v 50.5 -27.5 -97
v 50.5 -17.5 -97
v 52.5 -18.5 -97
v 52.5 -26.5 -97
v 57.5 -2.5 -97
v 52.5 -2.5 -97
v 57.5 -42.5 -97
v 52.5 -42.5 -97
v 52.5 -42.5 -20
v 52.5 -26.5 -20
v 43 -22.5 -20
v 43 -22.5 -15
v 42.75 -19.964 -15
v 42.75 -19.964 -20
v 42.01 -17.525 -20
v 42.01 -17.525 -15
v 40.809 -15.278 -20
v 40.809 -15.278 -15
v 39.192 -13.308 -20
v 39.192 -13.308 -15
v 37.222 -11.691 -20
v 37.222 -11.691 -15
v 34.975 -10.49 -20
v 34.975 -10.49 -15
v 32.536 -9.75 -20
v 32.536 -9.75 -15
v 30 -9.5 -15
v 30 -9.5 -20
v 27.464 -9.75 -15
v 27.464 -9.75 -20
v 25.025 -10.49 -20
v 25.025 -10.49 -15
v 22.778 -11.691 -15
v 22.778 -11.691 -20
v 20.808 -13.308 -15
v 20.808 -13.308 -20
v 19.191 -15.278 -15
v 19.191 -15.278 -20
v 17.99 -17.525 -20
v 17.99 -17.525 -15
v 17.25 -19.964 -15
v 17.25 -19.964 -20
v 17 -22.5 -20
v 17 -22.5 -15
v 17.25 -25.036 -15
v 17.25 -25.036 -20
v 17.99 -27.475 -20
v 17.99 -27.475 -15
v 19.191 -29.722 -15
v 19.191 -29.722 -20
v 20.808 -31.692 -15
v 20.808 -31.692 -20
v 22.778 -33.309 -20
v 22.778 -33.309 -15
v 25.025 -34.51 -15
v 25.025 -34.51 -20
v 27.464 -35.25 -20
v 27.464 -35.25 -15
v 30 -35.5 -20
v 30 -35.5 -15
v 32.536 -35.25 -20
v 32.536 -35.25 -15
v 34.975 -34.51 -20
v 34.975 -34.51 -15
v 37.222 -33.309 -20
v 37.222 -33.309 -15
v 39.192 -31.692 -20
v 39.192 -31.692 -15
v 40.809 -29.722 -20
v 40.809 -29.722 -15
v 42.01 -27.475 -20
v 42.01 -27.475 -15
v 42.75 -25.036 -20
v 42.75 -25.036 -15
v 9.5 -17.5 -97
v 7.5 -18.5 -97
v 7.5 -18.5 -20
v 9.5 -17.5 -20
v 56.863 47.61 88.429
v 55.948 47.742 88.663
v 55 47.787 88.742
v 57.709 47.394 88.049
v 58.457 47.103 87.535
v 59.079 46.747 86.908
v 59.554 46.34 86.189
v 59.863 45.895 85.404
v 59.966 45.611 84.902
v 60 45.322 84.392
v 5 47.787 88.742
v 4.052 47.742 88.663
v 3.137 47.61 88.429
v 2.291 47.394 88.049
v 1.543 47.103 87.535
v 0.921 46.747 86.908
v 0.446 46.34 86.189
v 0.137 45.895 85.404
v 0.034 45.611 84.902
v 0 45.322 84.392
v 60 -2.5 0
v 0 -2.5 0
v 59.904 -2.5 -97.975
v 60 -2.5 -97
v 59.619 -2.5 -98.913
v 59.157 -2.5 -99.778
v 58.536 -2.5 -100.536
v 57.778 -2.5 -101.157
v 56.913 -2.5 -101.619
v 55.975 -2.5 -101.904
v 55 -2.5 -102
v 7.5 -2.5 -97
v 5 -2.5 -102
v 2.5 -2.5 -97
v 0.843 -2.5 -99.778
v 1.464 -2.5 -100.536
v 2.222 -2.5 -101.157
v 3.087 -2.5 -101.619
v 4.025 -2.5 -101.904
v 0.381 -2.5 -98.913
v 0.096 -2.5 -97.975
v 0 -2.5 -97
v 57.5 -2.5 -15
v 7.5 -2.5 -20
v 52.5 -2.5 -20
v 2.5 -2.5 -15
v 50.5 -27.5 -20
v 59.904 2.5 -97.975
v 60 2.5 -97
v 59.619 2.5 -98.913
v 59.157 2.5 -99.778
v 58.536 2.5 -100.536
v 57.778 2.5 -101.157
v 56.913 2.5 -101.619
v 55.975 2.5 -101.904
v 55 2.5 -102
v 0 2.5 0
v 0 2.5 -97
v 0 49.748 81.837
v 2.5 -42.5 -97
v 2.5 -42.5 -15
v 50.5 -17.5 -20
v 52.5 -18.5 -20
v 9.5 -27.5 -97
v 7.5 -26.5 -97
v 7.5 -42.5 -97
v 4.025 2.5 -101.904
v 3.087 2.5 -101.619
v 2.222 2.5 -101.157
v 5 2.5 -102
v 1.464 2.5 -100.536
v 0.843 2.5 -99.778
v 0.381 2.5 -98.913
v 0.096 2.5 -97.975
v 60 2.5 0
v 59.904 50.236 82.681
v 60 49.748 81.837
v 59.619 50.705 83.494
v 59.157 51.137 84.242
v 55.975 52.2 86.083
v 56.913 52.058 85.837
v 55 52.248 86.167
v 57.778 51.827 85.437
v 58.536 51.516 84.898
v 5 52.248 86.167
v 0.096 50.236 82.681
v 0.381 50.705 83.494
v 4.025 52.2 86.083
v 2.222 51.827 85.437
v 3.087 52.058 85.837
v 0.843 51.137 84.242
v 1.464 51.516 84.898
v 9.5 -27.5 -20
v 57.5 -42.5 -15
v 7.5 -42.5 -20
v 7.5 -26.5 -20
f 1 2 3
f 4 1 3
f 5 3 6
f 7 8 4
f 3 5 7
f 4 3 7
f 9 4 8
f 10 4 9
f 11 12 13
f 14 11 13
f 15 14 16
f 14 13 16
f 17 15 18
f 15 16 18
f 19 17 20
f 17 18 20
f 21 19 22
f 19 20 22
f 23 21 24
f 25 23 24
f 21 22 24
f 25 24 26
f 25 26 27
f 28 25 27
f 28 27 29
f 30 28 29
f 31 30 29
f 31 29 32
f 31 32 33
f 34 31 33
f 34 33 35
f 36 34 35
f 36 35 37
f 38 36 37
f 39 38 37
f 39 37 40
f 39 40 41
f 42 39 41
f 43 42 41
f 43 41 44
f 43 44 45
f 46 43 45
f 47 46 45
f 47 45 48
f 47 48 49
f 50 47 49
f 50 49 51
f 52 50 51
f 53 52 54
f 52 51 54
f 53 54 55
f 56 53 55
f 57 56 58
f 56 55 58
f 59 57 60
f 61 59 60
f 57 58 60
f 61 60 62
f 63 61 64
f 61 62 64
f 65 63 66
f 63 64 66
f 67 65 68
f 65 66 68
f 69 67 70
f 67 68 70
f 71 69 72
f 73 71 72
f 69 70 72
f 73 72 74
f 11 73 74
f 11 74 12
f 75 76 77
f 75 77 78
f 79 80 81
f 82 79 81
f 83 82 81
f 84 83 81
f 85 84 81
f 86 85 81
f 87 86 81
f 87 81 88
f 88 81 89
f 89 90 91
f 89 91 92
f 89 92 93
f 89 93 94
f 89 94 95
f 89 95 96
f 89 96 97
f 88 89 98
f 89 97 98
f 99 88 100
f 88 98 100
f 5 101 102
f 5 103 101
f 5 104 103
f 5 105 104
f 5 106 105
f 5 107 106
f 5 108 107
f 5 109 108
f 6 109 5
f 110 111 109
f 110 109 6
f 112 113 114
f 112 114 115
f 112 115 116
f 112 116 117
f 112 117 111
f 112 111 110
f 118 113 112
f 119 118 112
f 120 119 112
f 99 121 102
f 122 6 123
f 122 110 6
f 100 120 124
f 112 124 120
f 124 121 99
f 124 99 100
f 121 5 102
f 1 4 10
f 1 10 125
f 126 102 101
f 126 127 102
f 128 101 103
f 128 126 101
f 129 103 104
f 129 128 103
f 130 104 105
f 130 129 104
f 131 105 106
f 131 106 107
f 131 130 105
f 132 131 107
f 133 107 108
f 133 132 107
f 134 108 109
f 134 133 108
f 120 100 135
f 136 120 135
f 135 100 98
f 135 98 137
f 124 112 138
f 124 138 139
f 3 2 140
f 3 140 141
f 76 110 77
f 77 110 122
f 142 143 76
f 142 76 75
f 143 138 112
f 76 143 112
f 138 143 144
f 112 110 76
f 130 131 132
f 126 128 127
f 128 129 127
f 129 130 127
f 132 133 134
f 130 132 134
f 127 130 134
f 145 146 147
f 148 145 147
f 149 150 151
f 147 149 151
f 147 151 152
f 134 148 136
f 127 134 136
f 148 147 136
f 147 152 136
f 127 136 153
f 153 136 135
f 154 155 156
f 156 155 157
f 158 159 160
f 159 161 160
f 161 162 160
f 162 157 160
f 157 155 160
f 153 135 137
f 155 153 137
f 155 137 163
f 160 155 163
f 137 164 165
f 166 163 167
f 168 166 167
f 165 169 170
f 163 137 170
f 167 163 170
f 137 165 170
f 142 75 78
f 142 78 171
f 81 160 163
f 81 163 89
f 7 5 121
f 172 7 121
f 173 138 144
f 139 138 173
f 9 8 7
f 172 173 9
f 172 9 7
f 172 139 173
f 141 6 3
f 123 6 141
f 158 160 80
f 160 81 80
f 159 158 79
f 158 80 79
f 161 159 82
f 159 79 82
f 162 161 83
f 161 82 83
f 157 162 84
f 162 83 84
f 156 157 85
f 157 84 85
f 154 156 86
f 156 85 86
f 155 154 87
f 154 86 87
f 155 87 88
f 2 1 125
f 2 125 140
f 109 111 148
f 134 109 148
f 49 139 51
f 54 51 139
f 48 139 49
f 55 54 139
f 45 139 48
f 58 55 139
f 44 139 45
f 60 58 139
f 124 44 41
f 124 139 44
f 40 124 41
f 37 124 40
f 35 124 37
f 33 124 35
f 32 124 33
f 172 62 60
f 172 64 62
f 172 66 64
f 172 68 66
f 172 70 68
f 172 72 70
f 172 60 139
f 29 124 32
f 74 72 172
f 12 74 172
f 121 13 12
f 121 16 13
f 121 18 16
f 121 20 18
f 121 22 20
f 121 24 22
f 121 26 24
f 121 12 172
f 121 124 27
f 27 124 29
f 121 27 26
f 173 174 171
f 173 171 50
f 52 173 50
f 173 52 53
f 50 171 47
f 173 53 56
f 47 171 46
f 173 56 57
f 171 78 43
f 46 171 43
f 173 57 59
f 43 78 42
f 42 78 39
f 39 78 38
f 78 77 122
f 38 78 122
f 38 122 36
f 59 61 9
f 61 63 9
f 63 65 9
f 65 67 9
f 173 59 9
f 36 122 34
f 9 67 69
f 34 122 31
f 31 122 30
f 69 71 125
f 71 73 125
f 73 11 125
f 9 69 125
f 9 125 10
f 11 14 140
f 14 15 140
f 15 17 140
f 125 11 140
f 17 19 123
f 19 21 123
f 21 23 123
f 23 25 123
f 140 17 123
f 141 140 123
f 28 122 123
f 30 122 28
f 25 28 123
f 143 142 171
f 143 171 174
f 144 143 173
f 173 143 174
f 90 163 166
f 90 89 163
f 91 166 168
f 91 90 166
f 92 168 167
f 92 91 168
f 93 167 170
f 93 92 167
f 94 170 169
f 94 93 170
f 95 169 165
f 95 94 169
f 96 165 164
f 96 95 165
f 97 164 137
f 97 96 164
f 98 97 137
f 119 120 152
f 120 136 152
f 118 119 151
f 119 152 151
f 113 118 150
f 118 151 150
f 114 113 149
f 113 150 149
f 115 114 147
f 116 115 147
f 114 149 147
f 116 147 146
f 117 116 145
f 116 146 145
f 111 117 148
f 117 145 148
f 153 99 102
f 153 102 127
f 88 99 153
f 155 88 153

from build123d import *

# Parameters (mm, degrees)
F0_W      = 5
F0_H      = 102
F1_DEPTH  = 60
F2_W      = 5
F2_H      = 82
F3_DEPTH  = 40
F4_R      = 5
F5_W      = 45
F5_H      = 5
F6_DEPTH  = 40
F7_R      = 13
F8_DEPTH  = 25
F10_DEPTH = 77
F12_DEPTH = 77


with BuildPart() as f1:
    # F0 (on Right) → F1 (new body)
    with BuildSketch(Plane.YZ):
        Polygon((47.787035, 88.742403), (-2.5, 0), (2.5, 0), (52.248346, 86.166664), align=None)
        with Locations((0, -51)):
            Rectangle(F0_W, F0_H)
    extrude(amount=F1_DEPTH)

    # F2 (on face) → F3 (join)
    with BuildSketch(Plane.XZ.offset(2.5)):
        with Locations((5, -56)):
            Rectangle(F2_W, F2_H)
        with Locations((55, -56)):
            Rectangle(F2_W, F2_H)
    extrude(amount=F3_DEPTH)

    # F4
    f4_edges = [f1.edges().sort_by_distance(p)[0] for p in [
        (0, 50.017691, 87.454534),
        (60, 50.017691, 87.454534),
        (60, 0, -102),
        (0, 0, -102),
    ]]
    fillet(f4_edges, radius=F4_R)

    # F5 (on face) → F6 (join)
    with BuildSketch(Plane.XZ.offset(2.5)):
        with Locations((30, -17.5)):
            Rectangle(F5_W, F5_H)
    extrude(amount=F6_DEPTH)

    # F7 (on face) → F8 (cut)
    with BuildSketch(Plane.XY.offset(-15)):
        with Locations((30, -22.5)):
            Circle(F7_R)
    extrude(amount=-F8_DEPTH, mode=Mode.SUBTRACT)

    # F9 (on face) → F10 (join, through all)
    with BuildSketch(Plane(origin=(0, 0, -97), x_dir=(1, 0, 0), z_dir=(0, 0, -1))):
        Polygon((9.5, 27.5), (7.5, 26.5), (7.5, 18.5), (9.5, 17.5), (9.5, 18.5), (9.5, 26.5), align=None)
    extrude(amount=-F10_DEPTH)

    # F11 (on face) → F12 (join, through all)
    with BuildSketch(Plane(origin=(0, 0, -97), x_dir=(1, 0, 0), z_dir=(0, 0, -1))):
        Polygon((52.5, 18.5), (52.5, 26.5), (50.5, 27.5), (50.5, 26.5), (50.5, 18.5), (50.5, 17.5), align=None)
    extrude(amount=-F12_DEPTH)


solid = f1.part
